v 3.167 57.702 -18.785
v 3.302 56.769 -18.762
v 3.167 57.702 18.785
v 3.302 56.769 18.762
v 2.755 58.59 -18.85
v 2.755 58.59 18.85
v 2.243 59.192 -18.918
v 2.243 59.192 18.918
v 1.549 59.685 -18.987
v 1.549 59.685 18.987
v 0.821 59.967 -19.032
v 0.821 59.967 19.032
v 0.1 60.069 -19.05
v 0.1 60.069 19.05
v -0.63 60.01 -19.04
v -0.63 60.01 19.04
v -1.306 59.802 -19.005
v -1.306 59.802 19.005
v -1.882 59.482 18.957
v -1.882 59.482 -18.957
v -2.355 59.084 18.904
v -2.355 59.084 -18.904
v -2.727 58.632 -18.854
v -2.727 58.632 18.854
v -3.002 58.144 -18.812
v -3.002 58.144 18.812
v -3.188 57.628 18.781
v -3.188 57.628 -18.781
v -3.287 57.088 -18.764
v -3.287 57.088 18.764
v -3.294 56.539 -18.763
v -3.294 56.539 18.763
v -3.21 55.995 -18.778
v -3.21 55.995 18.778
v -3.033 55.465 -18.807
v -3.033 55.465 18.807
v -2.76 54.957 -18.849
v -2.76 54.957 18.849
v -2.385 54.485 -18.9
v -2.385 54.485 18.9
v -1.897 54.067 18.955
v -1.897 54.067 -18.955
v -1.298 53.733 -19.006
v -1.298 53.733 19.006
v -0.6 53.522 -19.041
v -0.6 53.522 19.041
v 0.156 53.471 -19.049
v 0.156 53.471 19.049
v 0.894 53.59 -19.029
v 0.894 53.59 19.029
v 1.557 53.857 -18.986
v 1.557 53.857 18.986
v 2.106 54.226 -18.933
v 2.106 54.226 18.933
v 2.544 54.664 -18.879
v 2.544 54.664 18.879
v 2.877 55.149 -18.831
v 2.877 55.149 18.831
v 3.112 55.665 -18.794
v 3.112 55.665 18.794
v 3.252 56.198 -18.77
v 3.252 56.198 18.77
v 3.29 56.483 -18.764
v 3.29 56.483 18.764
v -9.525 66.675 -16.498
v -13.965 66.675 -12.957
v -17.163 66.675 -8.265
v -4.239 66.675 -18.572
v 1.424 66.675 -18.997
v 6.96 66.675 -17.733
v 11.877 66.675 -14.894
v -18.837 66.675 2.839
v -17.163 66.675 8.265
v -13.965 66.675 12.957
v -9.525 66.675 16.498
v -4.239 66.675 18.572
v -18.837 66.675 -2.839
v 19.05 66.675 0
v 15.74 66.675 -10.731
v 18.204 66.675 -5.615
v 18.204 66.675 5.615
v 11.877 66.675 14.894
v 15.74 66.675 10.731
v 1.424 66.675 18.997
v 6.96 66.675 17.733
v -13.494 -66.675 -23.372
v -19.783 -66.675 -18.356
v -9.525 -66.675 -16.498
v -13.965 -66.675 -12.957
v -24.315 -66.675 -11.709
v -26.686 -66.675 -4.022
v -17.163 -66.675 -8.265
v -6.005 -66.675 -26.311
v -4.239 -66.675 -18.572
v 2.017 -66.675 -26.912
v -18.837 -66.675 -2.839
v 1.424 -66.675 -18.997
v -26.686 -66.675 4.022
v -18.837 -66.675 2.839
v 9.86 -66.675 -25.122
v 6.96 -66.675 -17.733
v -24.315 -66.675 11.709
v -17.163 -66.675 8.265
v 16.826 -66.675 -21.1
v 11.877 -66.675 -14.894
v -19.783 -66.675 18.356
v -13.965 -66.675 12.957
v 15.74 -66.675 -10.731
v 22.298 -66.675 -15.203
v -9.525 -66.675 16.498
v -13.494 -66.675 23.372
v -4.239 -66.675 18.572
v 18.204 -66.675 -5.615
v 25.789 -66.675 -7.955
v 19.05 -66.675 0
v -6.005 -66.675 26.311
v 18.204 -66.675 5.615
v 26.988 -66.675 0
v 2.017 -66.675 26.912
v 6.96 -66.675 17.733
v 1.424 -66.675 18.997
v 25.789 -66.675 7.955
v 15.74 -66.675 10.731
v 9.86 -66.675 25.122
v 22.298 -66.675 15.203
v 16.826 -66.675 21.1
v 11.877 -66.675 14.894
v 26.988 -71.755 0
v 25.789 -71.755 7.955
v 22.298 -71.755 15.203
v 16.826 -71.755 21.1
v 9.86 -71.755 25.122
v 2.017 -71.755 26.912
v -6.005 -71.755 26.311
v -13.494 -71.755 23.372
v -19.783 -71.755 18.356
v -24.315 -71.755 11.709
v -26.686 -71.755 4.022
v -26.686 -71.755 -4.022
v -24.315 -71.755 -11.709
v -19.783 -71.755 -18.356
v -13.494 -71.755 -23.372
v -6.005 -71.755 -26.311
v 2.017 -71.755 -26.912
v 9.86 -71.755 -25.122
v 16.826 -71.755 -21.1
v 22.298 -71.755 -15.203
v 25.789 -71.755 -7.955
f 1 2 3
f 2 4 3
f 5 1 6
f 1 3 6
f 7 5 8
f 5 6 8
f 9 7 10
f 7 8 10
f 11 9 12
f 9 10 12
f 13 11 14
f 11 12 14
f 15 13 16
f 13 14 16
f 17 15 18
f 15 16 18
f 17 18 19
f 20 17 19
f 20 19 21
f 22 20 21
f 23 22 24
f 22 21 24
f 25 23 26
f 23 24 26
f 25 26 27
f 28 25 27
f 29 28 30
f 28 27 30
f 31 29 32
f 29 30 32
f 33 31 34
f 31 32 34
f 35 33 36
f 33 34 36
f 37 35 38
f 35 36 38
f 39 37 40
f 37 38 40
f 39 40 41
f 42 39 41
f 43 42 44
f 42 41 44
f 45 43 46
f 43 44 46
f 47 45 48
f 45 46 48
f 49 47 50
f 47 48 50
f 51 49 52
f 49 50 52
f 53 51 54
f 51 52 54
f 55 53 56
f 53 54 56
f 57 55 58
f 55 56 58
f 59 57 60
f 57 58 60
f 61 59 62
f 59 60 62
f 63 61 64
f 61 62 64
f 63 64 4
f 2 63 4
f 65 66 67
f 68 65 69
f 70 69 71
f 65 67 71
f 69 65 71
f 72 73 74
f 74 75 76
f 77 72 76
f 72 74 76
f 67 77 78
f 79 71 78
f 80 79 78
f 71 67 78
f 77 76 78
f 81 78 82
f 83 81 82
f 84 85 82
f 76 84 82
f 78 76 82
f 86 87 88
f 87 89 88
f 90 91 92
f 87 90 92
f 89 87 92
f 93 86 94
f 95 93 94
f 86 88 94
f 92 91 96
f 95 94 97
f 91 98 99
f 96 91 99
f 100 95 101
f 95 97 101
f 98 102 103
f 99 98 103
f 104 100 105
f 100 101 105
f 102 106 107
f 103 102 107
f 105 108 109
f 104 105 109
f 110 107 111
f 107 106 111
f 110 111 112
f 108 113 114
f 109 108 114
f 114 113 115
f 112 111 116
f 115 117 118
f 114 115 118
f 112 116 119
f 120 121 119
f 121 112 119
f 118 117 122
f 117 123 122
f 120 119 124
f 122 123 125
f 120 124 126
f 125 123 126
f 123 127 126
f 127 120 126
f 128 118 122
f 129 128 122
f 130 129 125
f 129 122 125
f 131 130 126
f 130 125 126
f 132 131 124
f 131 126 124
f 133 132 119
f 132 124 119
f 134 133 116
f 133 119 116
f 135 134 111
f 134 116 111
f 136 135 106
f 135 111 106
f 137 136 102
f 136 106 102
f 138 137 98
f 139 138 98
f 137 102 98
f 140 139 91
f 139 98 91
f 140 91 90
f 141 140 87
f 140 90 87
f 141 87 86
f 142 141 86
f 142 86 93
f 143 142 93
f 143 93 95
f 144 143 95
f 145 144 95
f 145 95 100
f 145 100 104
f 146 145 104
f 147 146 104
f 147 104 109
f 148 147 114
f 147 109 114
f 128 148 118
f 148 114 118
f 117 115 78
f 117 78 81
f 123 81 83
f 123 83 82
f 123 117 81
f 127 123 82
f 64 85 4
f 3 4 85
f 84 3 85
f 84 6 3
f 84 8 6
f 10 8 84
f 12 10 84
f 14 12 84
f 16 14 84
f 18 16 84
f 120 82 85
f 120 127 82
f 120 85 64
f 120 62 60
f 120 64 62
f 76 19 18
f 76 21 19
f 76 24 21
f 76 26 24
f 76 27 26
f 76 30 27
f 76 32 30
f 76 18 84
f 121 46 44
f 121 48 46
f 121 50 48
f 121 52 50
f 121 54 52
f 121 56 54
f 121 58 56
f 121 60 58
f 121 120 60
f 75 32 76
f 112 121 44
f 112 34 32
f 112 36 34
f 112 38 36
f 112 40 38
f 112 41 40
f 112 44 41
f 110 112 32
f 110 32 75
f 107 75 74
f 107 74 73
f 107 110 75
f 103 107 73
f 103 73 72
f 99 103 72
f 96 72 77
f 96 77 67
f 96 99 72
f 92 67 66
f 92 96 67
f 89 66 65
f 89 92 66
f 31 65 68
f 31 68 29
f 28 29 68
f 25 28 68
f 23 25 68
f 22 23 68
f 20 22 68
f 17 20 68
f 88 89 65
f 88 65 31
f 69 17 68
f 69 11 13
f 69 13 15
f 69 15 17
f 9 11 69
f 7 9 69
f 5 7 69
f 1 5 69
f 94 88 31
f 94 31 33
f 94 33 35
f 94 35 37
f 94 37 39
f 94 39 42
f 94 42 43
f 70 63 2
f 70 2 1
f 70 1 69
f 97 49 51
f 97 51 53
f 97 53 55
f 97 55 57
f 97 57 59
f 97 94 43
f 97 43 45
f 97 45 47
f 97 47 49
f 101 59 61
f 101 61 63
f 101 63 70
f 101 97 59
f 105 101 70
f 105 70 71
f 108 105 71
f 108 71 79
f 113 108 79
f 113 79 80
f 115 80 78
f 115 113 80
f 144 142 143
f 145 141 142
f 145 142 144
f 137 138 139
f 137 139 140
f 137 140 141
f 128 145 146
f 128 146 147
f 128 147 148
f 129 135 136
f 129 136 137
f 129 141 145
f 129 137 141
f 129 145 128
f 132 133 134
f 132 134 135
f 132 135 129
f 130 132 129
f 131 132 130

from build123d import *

# Parameters (mm, degrees)
F0_R     = 19.05
F1_DEPTH = 66.675
F2_R     = 26.9875
F3_DEPTH = 5.08
F4_R     = 3.302
F5_DEPTH = 38.1


with BuildPart() as f1:
    # F0 (on Front) → F1 (new body, symmetric)
    with BuildSketch(Plane.XZ):
        Circle(F0_R)
    extrude(amount=F1_DEPTH, both=True)

    # F2 (on face) → F3 (join)
    with BuildSketch(Plane.XZ.offset(66.675)):
        Circle(F2_R)
    extrude(amount=F3_DEPTH)

    # F4 (on Top) → F5 (cut, symmetric)
    with BuildSketch(Plane.XY):
        with Locations((0, 56.769)):
            Circle(F4_R)
    extrude(amount=F5_DEPTH, both=True, mode=Mode.SUBTRACT)


solid = f1.part
